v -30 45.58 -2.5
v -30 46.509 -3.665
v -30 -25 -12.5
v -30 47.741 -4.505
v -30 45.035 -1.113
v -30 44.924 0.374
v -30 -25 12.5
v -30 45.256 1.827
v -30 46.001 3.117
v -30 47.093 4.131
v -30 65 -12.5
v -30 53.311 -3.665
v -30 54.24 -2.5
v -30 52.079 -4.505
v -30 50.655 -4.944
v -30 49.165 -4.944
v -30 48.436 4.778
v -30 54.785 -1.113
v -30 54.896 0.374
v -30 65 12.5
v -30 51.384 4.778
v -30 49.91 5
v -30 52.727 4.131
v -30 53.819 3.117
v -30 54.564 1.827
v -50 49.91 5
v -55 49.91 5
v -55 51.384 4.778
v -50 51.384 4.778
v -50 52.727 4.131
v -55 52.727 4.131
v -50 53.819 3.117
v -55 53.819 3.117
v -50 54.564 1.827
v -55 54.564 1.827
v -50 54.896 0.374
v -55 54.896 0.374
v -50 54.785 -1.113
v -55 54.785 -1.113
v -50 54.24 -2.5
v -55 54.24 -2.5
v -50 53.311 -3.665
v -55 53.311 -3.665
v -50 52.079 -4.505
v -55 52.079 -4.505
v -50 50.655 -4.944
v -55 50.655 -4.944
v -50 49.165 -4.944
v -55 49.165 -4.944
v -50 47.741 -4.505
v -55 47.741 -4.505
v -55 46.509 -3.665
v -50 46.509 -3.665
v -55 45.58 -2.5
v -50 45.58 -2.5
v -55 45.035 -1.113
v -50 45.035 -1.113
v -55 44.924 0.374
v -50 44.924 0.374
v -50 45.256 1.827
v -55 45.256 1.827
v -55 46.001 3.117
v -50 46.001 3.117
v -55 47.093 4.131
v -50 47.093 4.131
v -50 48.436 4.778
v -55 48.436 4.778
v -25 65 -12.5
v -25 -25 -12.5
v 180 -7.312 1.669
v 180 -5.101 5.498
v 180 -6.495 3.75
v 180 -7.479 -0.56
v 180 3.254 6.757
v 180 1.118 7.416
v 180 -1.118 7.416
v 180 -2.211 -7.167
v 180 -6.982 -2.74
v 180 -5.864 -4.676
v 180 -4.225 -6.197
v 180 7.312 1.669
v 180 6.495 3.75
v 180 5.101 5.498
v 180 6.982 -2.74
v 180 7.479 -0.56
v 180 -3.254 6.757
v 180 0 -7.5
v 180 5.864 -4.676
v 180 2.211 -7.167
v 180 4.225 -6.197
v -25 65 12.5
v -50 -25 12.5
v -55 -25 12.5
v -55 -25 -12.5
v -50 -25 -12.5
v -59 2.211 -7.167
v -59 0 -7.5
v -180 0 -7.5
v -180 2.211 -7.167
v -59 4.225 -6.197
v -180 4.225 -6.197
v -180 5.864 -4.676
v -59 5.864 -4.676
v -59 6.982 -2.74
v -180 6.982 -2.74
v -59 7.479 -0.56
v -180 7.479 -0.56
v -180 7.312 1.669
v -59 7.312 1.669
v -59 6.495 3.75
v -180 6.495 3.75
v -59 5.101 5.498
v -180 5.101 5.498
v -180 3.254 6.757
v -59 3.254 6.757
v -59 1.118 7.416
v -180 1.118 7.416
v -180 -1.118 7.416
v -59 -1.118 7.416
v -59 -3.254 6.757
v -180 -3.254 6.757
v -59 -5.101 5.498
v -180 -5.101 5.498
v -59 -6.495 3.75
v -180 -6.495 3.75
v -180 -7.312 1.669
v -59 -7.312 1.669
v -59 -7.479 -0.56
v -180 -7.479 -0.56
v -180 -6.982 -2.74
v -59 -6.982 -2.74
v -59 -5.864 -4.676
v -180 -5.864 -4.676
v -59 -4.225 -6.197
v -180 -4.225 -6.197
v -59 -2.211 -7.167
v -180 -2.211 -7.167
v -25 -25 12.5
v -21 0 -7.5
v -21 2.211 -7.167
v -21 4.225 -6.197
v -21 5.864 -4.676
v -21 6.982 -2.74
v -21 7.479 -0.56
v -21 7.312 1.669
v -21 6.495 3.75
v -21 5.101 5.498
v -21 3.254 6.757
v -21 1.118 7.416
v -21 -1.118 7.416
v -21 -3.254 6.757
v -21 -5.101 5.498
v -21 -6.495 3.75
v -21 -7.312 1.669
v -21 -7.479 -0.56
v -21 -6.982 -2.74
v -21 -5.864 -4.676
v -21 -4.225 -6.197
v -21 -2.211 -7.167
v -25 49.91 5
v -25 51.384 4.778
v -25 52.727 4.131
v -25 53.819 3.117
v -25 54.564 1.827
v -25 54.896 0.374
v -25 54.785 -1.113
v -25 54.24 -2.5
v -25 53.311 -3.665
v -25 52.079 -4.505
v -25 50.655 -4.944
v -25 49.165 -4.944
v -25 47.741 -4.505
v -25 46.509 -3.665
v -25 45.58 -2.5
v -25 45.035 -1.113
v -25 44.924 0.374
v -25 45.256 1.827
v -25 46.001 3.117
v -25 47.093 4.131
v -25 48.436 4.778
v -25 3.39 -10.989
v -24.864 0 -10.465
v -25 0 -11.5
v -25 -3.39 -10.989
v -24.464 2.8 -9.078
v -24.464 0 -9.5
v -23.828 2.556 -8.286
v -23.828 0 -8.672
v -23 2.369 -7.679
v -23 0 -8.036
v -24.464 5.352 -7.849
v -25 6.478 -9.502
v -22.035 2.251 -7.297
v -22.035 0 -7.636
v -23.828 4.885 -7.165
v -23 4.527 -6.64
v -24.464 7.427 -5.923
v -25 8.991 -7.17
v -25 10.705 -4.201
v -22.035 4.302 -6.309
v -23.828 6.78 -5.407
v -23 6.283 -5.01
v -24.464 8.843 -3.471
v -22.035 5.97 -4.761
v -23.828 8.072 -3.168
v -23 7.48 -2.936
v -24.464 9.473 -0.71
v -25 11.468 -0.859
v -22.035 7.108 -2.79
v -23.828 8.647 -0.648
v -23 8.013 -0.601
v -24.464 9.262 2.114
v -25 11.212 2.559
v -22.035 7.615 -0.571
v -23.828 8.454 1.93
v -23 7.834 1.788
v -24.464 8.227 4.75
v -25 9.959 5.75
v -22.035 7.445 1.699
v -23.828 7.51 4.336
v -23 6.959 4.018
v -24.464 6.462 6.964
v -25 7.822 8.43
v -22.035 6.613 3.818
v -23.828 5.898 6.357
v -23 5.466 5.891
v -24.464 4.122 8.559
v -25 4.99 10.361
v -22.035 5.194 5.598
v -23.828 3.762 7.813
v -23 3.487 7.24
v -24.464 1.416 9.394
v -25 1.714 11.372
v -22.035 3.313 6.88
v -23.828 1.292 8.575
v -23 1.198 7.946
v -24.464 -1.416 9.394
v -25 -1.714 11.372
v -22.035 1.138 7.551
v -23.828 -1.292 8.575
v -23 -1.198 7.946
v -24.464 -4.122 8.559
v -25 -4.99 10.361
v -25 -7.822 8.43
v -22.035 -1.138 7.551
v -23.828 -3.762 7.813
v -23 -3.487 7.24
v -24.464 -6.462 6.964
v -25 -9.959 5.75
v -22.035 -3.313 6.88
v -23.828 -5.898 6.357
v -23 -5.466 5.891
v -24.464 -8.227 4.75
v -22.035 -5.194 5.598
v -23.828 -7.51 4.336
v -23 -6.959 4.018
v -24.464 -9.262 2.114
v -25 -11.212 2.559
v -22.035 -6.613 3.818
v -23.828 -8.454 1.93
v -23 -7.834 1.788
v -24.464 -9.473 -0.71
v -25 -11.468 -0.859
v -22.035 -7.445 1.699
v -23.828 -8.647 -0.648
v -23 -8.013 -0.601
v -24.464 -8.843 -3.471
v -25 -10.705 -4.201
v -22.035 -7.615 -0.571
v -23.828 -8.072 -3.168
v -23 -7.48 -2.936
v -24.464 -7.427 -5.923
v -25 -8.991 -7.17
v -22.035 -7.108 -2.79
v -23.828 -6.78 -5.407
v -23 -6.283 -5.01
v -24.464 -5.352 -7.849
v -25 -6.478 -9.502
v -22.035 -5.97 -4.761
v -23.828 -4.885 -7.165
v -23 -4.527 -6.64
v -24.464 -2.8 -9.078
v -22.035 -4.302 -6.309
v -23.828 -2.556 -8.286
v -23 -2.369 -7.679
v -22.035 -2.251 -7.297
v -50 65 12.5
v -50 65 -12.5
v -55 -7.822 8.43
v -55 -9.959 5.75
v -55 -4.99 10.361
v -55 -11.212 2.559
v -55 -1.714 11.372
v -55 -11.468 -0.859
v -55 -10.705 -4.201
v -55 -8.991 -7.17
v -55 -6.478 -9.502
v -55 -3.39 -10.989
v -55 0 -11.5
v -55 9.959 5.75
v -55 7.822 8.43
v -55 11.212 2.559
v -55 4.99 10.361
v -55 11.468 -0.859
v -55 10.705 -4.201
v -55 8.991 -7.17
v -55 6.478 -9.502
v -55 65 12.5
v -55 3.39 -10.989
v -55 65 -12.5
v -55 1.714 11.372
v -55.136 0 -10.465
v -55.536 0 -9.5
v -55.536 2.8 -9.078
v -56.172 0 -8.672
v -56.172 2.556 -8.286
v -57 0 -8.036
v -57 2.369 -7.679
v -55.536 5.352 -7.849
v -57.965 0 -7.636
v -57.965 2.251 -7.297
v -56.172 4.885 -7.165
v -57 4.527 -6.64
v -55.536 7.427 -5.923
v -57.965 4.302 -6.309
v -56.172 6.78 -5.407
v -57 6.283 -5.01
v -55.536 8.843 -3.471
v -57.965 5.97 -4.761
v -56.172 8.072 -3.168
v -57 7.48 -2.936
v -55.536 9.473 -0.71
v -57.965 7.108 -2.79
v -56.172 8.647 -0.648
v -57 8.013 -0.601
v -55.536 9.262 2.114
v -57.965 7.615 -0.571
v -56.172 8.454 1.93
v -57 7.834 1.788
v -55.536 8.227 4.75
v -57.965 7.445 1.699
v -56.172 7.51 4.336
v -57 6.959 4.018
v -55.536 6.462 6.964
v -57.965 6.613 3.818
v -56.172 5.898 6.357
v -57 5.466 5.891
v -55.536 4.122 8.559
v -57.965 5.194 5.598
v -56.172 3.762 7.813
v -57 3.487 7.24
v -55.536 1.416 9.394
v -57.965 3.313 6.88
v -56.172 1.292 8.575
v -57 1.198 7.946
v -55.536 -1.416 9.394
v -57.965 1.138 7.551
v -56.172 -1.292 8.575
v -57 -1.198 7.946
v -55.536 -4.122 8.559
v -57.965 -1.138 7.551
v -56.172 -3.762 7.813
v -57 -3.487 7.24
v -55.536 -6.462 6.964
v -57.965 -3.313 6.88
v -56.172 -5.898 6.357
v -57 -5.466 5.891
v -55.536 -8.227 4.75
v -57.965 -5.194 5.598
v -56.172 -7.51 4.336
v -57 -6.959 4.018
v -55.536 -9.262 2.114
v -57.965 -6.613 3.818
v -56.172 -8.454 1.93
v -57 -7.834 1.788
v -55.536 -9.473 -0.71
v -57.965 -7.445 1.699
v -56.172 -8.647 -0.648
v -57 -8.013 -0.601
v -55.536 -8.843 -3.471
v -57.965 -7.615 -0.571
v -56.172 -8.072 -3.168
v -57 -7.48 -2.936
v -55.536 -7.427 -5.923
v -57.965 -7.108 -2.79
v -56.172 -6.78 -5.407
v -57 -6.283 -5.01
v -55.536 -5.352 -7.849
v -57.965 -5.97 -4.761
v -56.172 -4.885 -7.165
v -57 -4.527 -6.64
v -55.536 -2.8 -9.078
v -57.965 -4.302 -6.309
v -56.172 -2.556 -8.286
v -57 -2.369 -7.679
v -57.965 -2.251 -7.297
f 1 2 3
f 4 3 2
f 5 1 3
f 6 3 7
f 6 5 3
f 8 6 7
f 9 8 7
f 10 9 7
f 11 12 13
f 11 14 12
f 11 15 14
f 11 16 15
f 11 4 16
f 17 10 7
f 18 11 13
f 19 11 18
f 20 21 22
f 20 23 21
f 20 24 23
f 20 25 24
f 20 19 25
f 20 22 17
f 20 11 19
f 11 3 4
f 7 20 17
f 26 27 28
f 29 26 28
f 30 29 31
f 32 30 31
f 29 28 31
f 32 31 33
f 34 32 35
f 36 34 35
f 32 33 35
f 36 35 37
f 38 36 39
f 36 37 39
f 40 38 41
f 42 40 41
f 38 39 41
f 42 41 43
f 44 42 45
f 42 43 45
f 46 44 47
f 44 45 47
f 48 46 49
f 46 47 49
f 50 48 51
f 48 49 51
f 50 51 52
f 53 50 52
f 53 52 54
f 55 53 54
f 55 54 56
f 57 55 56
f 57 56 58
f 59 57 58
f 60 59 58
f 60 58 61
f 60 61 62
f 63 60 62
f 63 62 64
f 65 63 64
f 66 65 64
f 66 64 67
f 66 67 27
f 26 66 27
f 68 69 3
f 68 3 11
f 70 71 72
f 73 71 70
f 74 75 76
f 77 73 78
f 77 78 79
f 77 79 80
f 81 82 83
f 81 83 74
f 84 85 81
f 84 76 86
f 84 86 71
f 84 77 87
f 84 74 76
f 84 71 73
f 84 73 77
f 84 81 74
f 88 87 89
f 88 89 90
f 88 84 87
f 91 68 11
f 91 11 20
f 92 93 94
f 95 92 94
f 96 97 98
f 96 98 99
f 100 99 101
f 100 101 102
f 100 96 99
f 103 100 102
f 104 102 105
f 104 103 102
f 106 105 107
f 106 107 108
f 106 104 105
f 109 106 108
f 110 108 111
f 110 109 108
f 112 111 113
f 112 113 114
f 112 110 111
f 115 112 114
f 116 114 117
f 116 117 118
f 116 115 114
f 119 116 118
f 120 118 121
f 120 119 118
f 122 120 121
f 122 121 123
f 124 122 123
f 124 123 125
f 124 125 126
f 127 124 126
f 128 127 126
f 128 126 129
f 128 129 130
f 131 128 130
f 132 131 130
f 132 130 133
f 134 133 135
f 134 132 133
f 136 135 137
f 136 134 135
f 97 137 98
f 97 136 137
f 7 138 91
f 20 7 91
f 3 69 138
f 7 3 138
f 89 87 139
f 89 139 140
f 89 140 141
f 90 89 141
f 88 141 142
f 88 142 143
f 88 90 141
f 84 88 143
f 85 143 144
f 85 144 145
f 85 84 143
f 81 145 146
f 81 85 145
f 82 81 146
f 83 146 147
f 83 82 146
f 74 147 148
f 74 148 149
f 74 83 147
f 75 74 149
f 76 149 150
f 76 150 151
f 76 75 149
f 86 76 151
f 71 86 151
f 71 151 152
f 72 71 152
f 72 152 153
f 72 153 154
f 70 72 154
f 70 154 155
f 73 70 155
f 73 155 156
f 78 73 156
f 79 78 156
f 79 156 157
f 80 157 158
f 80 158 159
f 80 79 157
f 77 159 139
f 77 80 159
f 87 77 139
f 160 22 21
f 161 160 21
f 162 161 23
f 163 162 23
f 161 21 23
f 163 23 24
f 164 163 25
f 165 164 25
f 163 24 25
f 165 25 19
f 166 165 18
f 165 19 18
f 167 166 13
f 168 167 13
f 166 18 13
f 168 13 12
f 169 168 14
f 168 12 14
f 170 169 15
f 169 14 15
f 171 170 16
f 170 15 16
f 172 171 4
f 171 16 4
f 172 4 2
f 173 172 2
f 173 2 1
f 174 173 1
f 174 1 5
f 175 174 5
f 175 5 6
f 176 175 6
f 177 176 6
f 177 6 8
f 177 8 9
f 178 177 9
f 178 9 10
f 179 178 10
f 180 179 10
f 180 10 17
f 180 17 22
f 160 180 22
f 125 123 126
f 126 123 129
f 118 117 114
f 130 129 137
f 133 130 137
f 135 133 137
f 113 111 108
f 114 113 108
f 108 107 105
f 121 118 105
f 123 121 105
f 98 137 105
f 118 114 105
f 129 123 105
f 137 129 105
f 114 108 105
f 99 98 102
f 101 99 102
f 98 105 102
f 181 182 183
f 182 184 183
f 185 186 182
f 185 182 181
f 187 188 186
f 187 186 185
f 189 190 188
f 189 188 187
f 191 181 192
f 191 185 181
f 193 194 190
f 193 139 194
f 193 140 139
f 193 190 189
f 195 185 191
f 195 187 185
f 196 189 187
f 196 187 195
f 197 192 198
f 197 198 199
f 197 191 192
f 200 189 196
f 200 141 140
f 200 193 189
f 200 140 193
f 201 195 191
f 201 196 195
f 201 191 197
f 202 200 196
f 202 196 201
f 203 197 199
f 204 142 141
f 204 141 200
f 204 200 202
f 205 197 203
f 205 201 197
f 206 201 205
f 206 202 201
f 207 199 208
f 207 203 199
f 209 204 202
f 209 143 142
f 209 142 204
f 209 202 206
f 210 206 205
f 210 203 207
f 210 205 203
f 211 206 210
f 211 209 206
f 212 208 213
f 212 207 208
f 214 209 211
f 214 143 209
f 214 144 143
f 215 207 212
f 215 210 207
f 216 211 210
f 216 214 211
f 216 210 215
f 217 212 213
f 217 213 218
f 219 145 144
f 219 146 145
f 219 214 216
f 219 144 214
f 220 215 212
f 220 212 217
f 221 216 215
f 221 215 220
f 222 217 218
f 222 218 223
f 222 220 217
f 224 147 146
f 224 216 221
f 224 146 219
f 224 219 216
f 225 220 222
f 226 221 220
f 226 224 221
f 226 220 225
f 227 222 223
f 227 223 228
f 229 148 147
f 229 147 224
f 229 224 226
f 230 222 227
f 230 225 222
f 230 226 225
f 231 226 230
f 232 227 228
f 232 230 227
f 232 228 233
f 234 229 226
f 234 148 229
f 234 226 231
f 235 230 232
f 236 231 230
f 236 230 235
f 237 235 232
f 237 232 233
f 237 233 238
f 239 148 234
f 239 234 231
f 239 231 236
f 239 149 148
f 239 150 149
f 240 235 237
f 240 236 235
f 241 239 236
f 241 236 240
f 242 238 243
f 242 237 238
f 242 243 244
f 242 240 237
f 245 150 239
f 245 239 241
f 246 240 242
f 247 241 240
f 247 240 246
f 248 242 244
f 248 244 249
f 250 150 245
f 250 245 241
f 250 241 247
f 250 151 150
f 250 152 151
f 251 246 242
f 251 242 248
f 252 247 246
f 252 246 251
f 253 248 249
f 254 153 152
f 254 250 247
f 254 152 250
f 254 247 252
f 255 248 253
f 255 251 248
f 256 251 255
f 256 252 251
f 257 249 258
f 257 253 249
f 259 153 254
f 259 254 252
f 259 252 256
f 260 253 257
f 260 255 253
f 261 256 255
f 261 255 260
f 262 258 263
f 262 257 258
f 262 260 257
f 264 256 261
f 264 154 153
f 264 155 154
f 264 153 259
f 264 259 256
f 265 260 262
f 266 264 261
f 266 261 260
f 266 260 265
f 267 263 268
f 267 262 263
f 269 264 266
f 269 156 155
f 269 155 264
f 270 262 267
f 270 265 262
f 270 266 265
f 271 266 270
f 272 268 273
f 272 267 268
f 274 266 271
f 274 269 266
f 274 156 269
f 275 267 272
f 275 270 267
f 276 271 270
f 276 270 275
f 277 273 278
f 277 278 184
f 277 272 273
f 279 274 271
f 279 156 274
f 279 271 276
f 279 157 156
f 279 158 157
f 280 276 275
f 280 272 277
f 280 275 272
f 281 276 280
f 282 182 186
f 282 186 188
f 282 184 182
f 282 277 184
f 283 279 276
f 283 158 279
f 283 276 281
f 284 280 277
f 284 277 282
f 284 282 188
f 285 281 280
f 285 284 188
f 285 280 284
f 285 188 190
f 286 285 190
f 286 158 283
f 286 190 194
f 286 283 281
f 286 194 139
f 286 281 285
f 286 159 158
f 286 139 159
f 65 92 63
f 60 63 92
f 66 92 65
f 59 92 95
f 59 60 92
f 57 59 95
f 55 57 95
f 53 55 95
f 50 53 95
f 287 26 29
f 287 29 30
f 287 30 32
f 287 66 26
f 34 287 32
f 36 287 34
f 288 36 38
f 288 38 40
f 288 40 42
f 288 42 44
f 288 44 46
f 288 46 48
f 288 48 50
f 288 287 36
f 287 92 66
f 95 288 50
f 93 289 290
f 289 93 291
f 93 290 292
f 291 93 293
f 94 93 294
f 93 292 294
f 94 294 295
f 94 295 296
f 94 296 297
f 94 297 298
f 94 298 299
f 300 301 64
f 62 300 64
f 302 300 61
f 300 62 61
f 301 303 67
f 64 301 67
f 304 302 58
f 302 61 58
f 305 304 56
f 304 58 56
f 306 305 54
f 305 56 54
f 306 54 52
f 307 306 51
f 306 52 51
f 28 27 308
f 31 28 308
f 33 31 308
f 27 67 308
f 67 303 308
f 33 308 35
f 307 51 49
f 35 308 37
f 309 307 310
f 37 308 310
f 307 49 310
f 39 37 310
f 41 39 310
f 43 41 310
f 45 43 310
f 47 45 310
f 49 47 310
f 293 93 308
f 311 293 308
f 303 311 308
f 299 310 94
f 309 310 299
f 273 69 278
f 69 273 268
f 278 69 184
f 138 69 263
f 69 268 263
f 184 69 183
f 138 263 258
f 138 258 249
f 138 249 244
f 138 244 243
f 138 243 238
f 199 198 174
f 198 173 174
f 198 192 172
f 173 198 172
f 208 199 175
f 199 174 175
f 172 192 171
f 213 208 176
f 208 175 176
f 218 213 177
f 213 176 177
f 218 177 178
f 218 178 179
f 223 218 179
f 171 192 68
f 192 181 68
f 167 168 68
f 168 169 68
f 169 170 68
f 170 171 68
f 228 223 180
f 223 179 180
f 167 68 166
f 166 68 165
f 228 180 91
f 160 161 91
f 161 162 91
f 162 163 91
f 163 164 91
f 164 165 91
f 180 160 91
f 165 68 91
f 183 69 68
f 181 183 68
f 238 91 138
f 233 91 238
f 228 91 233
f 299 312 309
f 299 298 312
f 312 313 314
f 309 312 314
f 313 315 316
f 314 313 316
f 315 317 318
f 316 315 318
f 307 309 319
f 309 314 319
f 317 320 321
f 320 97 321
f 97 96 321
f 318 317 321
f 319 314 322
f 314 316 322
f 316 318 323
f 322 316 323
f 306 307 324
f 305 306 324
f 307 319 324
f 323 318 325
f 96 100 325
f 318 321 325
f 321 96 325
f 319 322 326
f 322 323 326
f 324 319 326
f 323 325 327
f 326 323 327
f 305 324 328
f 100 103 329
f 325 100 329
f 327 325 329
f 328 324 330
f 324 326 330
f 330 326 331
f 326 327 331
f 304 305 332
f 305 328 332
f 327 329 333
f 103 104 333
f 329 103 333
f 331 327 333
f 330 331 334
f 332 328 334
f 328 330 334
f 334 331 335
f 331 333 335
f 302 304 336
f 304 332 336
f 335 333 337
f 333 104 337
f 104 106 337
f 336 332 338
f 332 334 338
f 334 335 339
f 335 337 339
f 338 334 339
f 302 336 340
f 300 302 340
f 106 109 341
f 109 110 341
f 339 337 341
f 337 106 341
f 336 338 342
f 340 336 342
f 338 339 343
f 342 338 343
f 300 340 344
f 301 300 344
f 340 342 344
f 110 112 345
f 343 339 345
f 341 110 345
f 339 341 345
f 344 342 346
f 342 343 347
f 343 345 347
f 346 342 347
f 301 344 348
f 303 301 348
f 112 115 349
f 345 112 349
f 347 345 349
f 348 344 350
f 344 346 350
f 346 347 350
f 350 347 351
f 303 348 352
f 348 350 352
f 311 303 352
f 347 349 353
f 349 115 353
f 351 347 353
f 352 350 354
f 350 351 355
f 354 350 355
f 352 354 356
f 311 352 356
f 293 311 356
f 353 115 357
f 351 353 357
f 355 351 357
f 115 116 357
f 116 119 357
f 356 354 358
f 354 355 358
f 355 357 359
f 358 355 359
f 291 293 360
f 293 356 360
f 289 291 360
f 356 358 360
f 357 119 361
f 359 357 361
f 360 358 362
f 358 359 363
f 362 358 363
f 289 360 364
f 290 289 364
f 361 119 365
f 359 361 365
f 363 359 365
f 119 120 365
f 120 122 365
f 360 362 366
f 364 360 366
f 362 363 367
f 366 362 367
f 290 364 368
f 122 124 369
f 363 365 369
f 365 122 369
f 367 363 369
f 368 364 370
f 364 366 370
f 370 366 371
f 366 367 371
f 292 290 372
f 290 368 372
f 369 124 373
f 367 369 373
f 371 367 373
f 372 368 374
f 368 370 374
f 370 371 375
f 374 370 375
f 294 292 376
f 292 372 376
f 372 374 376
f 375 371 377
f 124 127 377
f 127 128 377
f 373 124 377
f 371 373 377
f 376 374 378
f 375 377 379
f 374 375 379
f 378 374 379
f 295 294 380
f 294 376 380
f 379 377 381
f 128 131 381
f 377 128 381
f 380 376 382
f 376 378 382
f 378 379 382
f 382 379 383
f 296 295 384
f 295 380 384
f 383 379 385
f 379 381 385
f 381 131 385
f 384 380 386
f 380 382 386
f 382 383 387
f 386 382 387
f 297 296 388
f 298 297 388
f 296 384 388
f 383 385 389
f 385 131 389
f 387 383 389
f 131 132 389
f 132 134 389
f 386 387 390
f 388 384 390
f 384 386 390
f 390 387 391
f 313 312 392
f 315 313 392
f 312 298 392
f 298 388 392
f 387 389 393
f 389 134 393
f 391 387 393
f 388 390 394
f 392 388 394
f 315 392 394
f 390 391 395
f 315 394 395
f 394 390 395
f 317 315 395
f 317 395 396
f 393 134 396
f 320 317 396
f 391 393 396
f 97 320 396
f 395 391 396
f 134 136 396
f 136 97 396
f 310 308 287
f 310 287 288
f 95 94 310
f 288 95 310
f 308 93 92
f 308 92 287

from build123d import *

# Parameters (mm, degrees)
SKETCH1_R               = 7.5
BOSS_EXTRUDE1_DEPTH     = 180
SKETCH2_W               = 30
SKETCH2_H               = 30
CUT_EXTRUDE1_DEPTH      = 180
SKETCH4_W               = 25
SKETCH4_H               = 90
BOSS_EXTRUDE2_DEPTH     = 5
SKETCH5_W               = 25
SKETCH5_H               = 90
BOSS_EXTRUDE3_DEPTH     = 5
SKETCH6_R               = 5
CUT_EXTRUDE2_DEPTH      = 126
CUT_EXTRUDE2_DEPTH_BACK = 236
FILLET1_R               = 4
FILLET2_R               = 4


with BuildPart() as part:
    # Sketch1 → Boss-Extrude1 (new body, symmetric)
    with BuildSketch(Plane(origin=(0, 0, 0), x_dir=(0, 0, -1), z_dir=(1, 0, 0))):
        Circle(SKETCH1_R)
    extrude(amount=BOSS_EXTRUDE1_DEPTH, both=True)

    # Sketch2 → Cut-Extrude1 (cut, symmetric)
    with BuildSketch(Plane.XY):
        with Locations((-40, 0)):
            Rectangle(SKETCH2_W, SKETCH2_H)
    extrude(amount=CUT_EXTRUDE1_DEPTH, both=True, mode=Mode.SUBTRACT)

    # Sketch4 → Boss-Extrude2 (add)
    with BuildSketch(Plane.ZY.offset(25)):
        with Locations((0, 20)):
            Rectangle(SKETCH4_W, SKETCH4_H)
    extrude(amount=BOSS_EXTRUDE2_DEPTH)

    # Sketch5 → Boss-Extrude3 (add)
    with BuildSketch(Plane(origin=(-55, 0, 0), x_dir=(0, 0, -1), z_dir=(1, 0, 0))):
        with Locations((0, 20)):
            Rectangle(SKETCH5_W, SKETCH5_H)
    extrude(amount=BOSS_EXTRUDE3_DEPTH)

    # Sketch6 → Cut-Extrude2 (cut, two sides)
    with BuildSketch(Plane.ZY.offset(55)) as cut_extrude2_sk:
        with Locations((0, 49.909918854)):
            Circle(SKETCH6_R)
    extrude(amount=CUT_EXTRUDE2_DEPTH, mode=Mode.SUBTRACT)
    extrude(cut_extrude2_sk.sketch, amount=-CUT_EXTRUDE2_DEPTH_BACK, mode=Mode.SUBTRACT)

    # Fillet1
    fillet1_edges = [part.edges().sort_by_distance(p)[0] for p in [
        (-55, 0, 7.5),
    ]]
    fillet(fillet1_edges, radius=FILLET1_R)

    # Fillet2
    fillet2_edges = [part.edges().sort_by_distance(p)[0] for p in [
        (-25, 0, 7.5),
    ]]
    fillet(fillet2_edges, radius=FILLET2_R)


solid = part.part
